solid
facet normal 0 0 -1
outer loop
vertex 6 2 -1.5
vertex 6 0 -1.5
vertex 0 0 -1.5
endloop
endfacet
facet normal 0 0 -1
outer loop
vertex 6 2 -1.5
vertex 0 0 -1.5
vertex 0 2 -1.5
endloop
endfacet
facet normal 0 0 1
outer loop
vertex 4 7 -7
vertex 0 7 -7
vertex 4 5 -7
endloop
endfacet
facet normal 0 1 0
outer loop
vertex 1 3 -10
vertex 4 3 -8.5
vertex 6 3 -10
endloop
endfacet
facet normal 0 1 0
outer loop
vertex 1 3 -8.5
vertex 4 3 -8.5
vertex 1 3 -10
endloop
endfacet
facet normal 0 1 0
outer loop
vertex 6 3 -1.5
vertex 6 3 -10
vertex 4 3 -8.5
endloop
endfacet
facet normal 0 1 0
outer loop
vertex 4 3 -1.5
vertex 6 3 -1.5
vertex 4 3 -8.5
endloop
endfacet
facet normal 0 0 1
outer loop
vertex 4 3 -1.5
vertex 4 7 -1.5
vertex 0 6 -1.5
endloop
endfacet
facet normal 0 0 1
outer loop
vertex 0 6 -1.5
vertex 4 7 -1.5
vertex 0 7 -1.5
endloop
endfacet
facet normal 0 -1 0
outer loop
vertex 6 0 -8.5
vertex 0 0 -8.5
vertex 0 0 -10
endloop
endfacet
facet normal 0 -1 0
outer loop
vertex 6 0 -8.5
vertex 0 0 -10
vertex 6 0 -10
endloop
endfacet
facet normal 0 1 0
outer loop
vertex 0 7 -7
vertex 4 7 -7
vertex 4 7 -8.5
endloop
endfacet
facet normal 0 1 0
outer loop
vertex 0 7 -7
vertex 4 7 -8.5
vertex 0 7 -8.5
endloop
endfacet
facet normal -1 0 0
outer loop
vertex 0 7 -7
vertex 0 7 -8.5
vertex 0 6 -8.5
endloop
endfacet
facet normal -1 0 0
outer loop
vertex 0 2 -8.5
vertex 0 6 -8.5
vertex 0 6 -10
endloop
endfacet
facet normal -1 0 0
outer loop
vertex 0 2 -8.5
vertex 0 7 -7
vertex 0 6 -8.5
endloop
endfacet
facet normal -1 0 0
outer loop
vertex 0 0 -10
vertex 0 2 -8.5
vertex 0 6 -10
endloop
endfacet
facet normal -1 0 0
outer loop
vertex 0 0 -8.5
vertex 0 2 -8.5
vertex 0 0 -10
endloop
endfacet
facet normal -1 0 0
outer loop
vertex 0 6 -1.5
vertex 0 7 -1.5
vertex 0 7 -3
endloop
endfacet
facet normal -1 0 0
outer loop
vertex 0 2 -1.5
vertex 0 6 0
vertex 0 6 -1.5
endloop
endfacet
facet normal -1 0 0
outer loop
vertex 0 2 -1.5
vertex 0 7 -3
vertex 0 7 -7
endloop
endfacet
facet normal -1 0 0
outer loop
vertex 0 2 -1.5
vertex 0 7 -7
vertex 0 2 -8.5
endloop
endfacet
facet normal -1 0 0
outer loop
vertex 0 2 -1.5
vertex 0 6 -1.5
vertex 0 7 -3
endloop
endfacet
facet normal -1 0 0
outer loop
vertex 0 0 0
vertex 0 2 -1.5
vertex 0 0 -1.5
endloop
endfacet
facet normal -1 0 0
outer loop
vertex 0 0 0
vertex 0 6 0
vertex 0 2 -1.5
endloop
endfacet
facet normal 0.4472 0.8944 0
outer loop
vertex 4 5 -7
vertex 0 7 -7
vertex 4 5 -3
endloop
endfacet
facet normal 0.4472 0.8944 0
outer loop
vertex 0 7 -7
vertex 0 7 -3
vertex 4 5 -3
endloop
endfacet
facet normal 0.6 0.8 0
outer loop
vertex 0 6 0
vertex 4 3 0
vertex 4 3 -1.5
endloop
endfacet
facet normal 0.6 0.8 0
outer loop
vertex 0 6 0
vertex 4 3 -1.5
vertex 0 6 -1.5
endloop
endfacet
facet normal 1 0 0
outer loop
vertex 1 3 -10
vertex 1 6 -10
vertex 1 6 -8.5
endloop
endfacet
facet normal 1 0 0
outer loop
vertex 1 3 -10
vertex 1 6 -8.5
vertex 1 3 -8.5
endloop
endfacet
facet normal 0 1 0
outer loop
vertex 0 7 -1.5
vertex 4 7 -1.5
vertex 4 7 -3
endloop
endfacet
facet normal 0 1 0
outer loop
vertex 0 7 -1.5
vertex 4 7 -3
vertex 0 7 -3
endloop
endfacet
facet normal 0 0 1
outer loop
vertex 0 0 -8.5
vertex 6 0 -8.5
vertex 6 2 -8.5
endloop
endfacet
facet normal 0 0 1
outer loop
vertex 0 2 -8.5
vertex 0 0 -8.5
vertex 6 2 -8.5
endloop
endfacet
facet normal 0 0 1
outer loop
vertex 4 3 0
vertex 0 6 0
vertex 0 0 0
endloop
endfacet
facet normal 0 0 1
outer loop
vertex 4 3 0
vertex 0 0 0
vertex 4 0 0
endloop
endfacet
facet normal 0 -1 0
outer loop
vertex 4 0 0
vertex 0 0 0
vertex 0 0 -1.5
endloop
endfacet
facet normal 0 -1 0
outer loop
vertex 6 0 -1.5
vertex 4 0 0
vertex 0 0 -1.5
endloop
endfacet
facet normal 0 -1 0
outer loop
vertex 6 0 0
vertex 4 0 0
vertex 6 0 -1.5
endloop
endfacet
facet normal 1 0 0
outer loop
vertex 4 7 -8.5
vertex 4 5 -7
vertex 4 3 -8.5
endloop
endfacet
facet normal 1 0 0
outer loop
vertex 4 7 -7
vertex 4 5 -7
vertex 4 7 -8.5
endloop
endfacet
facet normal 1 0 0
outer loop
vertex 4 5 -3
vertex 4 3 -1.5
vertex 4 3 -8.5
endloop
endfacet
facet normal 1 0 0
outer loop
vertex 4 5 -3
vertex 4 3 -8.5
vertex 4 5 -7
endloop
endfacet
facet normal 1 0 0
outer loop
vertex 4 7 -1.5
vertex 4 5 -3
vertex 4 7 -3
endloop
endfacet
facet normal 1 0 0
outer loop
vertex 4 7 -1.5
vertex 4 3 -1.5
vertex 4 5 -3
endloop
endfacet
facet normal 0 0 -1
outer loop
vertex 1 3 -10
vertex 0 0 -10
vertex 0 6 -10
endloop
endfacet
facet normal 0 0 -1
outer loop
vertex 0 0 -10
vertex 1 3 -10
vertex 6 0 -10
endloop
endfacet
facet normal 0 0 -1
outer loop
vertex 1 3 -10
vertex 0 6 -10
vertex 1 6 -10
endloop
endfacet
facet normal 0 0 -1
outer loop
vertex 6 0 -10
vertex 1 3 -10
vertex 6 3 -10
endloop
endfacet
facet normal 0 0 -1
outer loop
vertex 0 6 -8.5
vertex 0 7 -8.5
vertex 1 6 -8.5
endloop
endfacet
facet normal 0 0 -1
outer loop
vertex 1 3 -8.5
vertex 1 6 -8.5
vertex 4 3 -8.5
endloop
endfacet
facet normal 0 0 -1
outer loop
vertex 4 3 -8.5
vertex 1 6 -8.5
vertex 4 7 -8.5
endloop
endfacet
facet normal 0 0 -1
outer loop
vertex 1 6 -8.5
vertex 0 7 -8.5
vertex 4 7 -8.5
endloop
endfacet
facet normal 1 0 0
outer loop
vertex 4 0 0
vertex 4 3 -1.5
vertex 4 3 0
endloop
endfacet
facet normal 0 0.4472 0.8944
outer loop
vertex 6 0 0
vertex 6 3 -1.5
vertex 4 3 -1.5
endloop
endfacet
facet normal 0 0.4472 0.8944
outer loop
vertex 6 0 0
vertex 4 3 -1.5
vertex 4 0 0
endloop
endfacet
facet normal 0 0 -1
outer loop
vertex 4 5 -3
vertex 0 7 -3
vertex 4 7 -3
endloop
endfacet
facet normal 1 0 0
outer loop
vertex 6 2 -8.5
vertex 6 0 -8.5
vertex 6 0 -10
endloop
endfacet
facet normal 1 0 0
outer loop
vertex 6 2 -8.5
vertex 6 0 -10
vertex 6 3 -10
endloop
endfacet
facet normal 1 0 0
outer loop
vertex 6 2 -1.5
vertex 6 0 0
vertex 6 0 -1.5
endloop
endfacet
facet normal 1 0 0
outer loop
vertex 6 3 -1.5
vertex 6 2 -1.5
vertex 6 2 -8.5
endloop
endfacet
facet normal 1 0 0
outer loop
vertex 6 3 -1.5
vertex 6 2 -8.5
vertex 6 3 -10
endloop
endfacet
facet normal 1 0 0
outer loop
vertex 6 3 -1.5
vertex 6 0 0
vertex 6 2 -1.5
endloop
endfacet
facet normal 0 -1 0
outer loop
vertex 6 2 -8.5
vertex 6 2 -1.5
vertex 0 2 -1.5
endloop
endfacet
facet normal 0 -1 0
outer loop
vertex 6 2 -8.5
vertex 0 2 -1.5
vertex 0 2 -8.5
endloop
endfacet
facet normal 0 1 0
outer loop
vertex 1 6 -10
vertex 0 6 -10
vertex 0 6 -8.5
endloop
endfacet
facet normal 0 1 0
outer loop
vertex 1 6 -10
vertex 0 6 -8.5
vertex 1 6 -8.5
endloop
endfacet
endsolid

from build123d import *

# Parameters (mm, degrees)
SALIENTE_EXTRUIR1_DEPTH = 10
CORTAR_EXTRUIR1_DEPTH   = 1.5
CORTAR_EXTRUIR2_DEPTH   = 2
CORTAR_EXTRUIR3_REACH   = 8
CROQUIS5_W              = 7
CROQUIS5_H              = 2
CORTAR_EXTRUIR4_DEPTH   = 1.5
CORTAR_EXTRUIR5_DEPTH   = 2


with BuildPart() as part:
    # Croquis1 → Saliente-Extruir1 (new body)
    with BuildSketch(Plane.XY):
        Polygon((0, 0), (6, 0), (6, 3), (4, 3), (4, 7), (0, 7), align=None)
    extrude(amount=-SALIENTE_EXTRUIR1_DEPTH)

    # Croquis2 → Cortar-Extruir1 (cut)
    with BuildSketch(Plane.XY):
        Polygon((4, 3), (0, 6), (0, 7), (4, 7), align=None)
    extrude(amount=-CORTAR_EXTRUIR1_DEPTH, mode=Mode.SUBTRACT)

    # Croquis4 → Cortar-Extruir2 (cut)
    with BuildSketch(Plane(origin=(6, 0, 0), x_dir=(0, 0, -1), z_dir=(1, 0, 0))):
        Polygon((1.5, 3), (0, 0), (0, 3), align=None)
    extrude(amount=-CORTAR_EXTRUIR2_DEPTH, mode=Mode.SUBTRACT)

    # Croquis5 → Cortar-Extruir3 (cut, up to next)
    with BuildSketch(Plane(origin=(6, 0, 0), x_dir=(0, 0, -1), z_dir=(1, 0, 0)), mode=Mode.PRIVATE) as cortar_extruir3_sk1:
        with Locations((5, 1)):
            Rectangle(CROQUIS5_W, CROQUIS5_H)
    cortar_extruir3_tool1 = extrude(cortar_extruir3_sk1.sketch, amount=-CORTAR_EXTRUIR3_REACH, mode=Mode.PRIVATE) & part.part
    add(cortar_extruir3_tool1.solids().sort_by_distance((6, 1, -5))[0], mode=Mode.SUBTRACT)

    # Croquis6 → Cortar-Extruir4 (cut)
    with BuildSketch(Plane(origin=(0, 0, -10), x_dir=(-1, 0, 0), z_dir=(0, 0, -1))):
        Polygon((-4, 7), (0, 7), (0, 6), (-1, 6), (-1, 3), (-4, 3), align=None)
    extrude(amount=-CORTAR_EXTRUIR4_DEPTH, mode=Mode.SUBTRACT)

    # Croquis7 → Cortar-Extruir5 (cut, symmetric)
    with BuildSketch(Plane.XY.offset(-5)):
        Polygon((4, 5), (4, 7), (0, 7), align=None)
    extrude(amount=CORTAR_EXTRUIR5_DEPTH, both=True, mode=Mode.SUBTRACT)


solid = part.part
